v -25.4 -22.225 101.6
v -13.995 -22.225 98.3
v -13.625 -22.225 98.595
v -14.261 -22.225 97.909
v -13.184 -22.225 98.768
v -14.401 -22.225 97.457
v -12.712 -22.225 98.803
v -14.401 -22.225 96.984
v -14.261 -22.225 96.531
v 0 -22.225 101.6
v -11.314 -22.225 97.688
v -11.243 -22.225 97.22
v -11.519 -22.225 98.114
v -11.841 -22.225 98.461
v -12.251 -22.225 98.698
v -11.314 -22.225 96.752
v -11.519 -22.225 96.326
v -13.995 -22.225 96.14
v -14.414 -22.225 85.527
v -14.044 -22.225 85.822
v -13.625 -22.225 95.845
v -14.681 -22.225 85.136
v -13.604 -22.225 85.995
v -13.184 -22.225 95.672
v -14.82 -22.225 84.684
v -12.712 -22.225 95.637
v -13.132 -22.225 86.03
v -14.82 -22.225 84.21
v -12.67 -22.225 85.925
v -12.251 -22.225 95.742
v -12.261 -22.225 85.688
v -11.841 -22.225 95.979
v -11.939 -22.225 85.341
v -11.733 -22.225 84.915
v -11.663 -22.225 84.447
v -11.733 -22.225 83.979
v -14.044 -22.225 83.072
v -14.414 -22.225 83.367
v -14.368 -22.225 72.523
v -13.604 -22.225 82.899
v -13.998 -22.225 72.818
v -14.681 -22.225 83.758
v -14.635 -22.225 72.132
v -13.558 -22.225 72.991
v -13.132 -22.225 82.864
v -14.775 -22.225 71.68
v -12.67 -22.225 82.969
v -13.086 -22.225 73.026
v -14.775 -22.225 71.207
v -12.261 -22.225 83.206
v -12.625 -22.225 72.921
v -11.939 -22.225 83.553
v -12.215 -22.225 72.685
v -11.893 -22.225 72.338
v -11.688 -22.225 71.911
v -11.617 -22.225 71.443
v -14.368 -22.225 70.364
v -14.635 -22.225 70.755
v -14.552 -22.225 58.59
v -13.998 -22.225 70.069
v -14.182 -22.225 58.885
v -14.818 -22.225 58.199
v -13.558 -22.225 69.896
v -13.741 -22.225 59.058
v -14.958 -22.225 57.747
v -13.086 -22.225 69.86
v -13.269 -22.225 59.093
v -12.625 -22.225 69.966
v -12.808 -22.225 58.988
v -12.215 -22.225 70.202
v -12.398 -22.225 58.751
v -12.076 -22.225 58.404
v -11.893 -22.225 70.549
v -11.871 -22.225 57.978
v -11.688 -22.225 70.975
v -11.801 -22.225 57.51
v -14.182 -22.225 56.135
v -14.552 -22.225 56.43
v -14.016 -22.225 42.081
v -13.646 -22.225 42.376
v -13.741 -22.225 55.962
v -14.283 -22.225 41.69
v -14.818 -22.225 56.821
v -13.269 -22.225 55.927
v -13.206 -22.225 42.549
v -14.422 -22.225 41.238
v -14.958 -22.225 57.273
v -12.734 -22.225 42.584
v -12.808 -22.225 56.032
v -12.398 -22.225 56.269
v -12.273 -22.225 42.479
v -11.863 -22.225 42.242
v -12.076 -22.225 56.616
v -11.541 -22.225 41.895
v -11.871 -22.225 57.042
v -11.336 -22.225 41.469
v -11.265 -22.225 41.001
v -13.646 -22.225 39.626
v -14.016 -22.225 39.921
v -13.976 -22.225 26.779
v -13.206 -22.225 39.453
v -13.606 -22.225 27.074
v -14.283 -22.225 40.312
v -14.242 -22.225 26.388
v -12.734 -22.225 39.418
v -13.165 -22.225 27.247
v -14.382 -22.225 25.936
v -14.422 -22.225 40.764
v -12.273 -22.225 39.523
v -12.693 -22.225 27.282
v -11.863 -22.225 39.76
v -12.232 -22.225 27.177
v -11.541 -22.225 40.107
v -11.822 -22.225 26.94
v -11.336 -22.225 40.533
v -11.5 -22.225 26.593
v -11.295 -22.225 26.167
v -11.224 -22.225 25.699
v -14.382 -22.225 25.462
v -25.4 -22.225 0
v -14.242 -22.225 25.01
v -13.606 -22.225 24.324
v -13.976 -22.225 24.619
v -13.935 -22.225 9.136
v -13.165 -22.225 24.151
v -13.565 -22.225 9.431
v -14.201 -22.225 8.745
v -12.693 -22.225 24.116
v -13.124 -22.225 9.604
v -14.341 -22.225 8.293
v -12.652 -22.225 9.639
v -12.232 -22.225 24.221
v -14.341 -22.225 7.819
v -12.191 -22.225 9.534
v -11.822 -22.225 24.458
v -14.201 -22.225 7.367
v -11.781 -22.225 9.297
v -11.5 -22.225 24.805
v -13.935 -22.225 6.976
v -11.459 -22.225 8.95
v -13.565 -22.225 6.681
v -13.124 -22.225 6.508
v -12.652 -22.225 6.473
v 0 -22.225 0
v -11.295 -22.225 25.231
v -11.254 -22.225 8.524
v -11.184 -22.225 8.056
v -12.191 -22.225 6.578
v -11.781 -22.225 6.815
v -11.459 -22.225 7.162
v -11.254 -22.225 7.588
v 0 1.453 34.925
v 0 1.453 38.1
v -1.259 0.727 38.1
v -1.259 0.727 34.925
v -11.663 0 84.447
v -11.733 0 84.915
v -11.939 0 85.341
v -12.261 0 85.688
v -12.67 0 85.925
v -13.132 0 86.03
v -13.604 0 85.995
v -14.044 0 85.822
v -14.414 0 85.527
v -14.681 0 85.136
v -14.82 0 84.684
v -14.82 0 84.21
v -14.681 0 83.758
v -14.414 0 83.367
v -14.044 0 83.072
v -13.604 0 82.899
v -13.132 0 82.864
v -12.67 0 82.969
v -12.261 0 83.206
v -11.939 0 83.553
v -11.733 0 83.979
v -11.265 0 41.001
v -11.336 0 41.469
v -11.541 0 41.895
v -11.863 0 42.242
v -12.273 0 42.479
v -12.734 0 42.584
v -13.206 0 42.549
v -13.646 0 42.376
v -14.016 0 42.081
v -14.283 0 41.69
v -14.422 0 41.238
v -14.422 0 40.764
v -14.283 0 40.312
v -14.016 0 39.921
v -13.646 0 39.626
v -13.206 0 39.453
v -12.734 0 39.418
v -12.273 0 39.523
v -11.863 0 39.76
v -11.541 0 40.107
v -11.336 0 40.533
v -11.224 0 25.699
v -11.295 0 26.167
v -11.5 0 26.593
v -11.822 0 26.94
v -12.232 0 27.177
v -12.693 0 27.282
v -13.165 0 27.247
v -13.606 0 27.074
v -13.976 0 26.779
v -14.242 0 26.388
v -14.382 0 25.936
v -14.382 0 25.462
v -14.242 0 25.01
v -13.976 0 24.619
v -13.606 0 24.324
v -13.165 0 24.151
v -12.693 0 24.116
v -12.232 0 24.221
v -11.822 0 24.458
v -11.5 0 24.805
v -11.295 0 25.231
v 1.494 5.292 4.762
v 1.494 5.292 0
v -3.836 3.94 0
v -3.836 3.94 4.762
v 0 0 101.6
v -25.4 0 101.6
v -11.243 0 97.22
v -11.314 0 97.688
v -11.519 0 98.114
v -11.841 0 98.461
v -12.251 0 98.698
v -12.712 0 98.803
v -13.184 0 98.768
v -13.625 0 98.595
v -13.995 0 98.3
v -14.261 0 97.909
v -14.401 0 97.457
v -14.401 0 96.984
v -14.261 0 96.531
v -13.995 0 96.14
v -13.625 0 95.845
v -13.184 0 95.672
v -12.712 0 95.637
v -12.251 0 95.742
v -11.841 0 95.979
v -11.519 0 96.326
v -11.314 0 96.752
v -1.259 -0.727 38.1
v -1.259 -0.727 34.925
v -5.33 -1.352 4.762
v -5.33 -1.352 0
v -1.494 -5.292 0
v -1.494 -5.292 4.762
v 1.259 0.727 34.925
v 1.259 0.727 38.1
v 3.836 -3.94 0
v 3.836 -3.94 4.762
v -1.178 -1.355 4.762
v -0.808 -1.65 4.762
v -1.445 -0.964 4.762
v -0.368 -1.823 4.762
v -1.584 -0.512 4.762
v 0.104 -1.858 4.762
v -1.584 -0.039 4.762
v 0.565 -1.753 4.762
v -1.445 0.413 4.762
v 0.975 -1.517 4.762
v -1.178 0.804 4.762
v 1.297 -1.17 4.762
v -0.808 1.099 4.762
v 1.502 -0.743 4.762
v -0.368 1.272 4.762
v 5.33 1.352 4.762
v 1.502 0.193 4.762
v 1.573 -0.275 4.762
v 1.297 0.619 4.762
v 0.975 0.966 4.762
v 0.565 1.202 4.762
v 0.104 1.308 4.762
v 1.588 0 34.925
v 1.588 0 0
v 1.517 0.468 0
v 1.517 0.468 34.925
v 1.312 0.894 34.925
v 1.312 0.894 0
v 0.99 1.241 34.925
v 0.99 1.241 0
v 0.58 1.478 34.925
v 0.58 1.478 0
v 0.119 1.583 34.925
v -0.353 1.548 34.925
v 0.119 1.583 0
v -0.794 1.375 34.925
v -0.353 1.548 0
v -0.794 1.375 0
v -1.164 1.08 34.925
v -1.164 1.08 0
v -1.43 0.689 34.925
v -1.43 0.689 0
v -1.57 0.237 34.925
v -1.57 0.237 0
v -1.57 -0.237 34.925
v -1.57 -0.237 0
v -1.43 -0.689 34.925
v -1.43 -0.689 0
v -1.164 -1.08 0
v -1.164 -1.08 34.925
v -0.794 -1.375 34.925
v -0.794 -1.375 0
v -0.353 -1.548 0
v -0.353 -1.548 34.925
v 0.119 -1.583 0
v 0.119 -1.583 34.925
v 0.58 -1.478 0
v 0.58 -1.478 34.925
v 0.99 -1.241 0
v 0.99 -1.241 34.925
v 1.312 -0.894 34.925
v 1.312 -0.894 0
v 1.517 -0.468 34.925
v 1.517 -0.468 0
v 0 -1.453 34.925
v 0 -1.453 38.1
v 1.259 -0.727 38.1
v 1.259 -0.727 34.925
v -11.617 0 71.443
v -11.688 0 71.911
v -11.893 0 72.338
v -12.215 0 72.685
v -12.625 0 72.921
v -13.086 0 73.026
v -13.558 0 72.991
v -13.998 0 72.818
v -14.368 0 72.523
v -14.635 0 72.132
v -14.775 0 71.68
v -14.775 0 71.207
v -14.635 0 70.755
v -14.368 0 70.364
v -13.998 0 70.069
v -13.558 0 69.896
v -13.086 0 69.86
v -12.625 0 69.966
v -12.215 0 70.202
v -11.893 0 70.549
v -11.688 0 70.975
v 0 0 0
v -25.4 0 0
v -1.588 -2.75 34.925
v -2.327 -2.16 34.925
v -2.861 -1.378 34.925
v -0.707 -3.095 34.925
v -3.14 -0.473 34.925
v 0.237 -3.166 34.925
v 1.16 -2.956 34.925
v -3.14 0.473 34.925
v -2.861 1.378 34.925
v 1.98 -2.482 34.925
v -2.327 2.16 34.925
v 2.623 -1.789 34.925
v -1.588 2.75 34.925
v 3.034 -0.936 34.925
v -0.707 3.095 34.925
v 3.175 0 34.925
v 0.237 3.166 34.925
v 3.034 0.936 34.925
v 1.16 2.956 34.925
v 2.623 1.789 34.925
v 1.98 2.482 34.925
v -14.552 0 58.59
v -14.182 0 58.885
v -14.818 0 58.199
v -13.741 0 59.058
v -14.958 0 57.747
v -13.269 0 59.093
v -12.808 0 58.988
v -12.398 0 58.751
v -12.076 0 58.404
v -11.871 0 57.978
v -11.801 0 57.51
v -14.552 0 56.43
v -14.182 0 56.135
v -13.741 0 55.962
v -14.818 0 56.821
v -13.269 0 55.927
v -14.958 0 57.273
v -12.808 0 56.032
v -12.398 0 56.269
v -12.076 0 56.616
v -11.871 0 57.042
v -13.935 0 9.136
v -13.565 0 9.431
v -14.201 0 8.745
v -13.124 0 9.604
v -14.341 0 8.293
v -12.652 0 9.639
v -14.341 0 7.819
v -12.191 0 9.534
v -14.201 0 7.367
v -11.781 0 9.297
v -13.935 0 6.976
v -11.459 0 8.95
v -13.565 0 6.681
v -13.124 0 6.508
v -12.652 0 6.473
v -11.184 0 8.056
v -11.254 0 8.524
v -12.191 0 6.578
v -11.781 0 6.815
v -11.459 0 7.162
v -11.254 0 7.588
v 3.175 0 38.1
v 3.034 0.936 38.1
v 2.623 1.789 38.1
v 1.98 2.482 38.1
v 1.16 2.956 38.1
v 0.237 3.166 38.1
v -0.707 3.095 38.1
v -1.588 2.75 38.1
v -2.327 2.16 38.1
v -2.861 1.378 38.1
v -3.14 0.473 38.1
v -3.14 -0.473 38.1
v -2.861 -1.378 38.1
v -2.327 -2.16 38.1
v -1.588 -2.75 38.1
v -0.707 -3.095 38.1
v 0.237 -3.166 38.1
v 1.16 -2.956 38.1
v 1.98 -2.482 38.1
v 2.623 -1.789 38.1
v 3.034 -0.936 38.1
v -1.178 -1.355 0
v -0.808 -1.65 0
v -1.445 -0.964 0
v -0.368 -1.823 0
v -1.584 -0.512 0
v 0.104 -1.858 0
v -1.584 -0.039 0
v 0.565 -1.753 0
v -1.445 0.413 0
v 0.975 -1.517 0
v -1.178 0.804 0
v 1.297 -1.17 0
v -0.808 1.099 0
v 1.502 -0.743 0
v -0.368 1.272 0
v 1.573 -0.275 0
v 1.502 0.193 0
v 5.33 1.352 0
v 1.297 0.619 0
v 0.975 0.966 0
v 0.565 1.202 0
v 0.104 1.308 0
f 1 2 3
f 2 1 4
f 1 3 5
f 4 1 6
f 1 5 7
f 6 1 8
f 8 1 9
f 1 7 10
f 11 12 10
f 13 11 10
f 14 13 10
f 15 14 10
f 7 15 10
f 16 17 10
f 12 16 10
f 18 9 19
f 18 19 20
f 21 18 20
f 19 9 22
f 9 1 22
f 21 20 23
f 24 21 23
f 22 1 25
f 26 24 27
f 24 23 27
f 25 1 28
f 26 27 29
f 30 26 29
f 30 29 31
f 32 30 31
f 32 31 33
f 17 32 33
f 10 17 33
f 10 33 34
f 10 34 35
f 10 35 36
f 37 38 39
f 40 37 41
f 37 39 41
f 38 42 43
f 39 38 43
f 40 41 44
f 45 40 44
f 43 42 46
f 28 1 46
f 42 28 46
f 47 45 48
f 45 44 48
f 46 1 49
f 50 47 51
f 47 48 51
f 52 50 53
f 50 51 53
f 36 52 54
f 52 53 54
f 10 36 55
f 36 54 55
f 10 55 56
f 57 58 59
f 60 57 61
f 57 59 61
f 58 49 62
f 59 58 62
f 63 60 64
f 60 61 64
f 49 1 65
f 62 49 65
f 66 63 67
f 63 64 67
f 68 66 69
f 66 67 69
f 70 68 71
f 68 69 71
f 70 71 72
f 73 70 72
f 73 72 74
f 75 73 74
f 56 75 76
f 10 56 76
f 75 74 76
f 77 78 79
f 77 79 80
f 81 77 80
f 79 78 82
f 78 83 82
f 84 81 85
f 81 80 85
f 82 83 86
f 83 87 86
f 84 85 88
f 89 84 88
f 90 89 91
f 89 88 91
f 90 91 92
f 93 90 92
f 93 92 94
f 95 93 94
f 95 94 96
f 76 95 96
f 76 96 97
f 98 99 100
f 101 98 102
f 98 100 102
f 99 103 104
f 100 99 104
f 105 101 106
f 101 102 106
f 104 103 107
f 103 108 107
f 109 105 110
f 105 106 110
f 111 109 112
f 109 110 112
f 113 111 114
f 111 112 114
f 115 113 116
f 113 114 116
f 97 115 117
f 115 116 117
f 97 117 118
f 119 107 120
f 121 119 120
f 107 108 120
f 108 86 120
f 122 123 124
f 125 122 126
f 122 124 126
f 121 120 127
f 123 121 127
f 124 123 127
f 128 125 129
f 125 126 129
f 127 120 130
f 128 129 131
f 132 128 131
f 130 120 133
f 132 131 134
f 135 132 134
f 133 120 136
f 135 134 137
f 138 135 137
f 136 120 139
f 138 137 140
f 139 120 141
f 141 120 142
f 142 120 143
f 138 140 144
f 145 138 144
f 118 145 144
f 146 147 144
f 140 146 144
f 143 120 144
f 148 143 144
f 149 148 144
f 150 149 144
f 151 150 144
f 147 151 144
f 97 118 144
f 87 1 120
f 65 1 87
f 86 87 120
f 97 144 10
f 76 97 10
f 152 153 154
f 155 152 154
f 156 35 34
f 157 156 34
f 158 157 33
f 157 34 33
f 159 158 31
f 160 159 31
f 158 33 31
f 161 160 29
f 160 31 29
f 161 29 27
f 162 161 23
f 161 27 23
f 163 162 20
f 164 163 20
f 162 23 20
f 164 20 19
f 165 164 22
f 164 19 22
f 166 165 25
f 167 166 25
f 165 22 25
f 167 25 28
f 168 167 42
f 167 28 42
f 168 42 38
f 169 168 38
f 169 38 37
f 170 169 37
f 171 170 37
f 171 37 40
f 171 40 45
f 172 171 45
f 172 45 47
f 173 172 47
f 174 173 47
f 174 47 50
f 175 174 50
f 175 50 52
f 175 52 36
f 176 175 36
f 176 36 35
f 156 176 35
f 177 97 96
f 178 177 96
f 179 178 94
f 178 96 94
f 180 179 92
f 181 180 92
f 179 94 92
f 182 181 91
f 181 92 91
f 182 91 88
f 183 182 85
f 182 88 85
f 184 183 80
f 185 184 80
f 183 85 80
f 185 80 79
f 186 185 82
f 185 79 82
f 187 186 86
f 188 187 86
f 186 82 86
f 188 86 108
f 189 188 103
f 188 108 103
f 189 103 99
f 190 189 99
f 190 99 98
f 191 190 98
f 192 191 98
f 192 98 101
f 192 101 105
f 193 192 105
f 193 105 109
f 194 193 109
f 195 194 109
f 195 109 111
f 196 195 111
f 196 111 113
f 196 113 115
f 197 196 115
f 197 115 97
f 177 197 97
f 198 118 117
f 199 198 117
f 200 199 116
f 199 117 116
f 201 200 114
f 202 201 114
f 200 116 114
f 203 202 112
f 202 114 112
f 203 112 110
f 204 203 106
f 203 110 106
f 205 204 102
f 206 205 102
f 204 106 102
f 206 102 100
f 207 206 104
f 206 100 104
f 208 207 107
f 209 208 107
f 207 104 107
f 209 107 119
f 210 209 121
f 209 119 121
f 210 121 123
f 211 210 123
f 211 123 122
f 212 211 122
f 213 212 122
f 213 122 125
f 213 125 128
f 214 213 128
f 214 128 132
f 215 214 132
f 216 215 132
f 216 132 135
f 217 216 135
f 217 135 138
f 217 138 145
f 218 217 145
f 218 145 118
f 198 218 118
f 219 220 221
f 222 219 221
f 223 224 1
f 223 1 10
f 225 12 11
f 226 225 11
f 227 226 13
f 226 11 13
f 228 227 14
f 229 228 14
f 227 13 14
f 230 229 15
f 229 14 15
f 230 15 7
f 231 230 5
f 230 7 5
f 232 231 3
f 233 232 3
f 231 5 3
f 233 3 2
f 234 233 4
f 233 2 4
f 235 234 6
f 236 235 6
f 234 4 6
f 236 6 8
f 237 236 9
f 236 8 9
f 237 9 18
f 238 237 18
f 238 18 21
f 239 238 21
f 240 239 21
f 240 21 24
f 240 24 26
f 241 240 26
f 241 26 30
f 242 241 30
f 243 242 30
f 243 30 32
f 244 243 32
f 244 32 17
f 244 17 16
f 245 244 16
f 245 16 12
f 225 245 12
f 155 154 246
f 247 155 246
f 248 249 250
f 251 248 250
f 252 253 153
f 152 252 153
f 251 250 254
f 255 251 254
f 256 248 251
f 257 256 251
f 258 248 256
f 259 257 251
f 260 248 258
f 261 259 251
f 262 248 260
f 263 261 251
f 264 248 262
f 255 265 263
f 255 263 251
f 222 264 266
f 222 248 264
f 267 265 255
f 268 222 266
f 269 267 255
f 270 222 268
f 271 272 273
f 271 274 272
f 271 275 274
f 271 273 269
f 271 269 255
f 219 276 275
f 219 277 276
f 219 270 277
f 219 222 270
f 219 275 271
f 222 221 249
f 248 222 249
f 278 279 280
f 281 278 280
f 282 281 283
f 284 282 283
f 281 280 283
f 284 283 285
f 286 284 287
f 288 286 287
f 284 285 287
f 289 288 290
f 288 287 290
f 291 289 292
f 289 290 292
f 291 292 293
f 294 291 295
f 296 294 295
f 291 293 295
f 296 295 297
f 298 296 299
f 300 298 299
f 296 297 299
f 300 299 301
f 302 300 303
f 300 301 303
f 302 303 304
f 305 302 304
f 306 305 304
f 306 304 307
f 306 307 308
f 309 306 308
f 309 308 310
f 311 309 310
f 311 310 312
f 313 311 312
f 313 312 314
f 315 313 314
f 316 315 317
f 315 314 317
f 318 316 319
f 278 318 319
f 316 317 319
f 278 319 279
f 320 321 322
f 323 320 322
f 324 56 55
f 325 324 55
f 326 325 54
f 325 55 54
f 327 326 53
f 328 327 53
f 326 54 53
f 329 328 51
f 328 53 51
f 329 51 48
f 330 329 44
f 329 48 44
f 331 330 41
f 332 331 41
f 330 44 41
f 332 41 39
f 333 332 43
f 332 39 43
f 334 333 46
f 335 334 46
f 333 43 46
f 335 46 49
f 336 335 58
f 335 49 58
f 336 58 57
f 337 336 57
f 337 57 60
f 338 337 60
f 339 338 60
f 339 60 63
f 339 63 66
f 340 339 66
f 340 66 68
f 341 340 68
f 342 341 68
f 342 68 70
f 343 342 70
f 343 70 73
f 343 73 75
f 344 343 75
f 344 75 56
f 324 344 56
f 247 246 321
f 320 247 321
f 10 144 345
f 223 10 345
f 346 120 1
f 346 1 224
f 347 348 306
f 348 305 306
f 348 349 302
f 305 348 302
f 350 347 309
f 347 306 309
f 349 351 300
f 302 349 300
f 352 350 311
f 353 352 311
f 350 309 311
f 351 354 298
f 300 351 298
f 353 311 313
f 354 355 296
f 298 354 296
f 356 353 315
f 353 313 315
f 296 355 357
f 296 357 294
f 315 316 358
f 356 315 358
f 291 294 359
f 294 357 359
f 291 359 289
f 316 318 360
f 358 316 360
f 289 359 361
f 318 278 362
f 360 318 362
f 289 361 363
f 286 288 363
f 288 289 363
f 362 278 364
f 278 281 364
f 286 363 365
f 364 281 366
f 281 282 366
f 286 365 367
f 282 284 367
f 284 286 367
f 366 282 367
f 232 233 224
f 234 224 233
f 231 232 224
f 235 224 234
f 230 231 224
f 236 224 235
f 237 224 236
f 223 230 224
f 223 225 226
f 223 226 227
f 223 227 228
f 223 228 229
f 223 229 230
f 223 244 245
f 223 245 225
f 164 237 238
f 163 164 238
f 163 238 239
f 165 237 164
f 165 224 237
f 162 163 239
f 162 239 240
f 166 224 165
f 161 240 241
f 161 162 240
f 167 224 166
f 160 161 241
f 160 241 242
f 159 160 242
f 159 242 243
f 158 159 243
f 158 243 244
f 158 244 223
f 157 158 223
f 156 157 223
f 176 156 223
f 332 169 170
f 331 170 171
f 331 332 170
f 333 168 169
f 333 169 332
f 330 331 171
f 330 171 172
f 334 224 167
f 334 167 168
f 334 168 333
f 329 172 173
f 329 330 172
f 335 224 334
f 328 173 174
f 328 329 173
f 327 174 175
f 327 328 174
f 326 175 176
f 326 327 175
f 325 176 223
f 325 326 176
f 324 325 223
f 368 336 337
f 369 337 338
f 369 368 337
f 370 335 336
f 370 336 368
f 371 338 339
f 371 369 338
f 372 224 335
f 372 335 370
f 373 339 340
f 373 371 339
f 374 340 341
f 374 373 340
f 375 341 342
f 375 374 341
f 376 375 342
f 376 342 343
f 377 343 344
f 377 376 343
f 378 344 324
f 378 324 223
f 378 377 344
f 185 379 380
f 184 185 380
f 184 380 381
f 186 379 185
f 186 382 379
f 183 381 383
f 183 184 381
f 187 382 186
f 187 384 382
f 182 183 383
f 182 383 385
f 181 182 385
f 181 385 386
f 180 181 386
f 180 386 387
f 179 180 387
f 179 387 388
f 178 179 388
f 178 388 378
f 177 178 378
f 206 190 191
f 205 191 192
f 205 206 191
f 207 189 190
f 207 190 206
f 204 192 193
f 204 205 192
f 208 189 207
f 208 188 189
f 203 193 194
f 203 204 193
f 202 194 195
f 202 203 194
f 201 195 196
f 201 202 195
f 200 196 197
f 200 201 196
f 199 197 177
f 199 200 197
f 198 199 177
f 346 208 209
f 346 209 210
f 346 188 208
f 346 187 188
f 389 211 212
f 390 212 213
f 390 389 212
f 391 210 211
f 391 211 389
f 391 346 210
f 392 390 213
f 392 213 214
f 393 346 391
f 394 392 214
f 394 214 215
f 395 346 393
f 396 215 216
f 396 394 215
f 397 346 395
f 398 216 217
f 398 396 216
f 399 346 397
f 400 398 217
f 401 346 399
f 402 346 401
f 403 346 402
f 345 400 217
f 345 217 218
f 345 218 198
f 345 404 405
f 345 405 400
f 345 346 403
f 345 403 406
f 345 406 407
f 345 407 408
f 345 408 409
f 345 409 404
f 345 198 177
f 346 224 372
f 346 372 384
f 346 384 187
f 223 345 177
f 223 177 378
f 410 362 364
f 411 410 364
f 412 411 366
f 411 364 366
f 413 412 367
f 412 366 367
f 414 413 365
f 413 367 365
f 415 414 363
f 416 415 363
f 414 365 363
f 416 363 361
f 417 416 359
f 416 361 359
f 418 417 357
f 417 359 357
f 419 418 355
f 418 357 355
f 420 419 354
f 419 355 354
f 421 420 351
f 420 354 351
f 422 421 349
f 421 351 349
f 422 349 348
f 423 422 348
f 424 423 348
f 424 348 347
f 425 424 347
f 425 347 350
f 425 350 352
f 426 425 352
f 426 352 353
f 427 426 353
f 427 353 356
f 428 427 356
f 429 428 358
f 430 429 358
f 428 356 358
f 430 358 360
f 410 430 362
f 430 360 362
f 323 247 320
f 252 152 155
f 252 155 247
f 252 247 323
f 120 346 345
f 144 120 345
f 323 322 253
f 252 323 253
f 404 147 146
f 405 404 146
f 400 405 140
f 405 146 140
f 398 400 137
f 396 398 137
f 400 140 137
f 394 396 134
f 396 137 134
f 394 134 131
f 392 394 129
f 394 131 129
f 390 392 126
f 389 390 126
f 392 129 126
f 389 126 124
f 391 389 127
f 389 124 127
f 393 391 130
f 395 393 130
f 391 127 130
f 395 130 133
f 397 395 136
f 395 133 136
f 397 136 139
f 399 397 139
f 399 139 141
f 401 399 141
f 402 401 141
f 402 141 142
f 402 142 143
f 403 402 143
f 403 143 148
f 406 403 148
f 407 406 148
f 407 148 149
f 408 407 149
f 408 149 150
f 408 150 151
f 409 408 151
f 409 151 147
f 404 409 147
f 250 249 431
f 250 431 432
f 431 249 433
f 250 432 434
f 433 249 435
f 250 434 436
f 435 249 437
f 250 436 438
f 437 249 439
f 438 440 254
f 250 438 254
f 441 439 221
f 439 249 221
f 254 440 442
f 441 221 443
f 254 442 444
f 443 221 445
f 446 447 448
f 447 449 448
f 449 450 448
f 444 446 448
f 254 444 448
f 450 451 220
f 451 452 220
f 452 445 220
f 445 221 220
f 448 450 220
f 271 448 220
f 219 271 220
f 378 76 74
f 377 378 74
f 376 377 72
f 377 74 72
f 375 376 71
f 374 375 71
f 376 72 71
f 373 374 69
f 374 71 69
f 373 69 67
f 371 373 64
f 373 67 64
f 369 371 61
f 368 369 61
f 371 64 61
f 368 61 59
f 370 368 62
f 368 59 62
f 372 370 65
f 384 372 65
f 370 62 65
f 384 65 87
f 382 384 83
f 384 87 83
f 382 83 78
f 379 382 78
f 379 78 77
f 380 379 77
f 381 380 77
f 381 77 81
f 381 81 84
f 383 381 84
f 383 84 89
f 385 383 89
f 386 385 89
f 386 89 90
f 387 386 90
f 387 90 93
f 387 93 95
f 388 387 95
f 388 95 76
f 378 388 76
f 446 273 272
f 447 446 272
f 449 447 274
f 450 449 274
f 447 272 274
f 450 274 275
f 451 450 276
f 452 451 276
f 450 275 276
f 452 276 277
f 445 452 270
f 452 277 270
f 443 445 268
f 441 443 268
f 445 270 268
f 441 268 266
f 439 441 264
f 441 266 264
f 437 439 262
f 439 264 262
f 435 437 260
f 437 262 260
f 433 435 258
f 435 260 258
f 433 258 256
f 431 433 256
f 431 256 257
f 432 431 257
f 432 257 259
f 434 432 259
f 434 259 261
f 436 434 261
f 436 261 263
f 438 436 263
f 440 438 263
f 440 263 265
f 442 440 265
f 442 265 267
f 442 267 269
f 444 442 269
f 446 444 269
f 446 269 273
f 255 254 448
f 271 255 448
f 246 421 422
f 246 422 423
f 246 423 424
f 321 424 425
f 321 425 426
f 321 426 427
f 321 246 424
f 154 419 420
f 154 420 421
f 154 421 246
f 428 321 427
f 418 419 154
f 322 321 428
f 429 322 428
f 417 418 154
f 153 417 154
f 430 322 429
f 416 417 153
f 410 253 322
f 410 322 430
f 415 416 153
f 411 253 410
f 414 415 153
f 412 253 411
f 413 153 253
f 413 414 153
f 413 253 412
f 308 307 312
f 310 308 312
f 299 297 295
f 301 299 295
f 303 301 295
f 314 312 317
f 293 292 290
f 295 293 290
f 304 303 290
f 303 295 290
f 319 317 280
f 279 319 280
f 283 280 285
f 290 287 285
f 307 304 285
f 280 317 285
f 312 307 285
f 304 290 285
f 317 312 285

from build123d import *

# Parameters (mm, degrees)
F1_DEPTH  = 4.7625
F2_R      = 1.5875
F3_DEPTH  = 25.4
F4_R      = 1.5875
F5_DEPTH  = 34.925
F6_R      = 3.175
F7_DEPTH  = 3.175
F9_DEPTH  = 3.175
F10_W     = 25.4
F10_H     = 22.225
F11_DEPTH = 101.6
F12_R     = 1.5875
F13_DEPTH = 25.4


with BuildPart() as f1:
    # F0 (on Top) → F1 (new body)
    with BuildSketch(Plane.XY):
        Polygon((-5.330464, -1.352047), (-1.494325, -5.292341), (3.836139, -3.940293), (5.330464, 1.352047), (1.494325, 5.292341), (-3.836139, 3.940293), align=None)
    extrude(amount=F1_DEPTH)

    # F2 (on face) → F3 (cut)
    with BuildSketch(Plane.XY.offset(4.7625)):
        with Locations((-0.014651, -0.275343)):
            Circle(F2_R)
    extrude(amount=-F3_DEPTH, mode=Mode.SUBTRACT)


with BuildPart() as f5:
    # F4 (on Top) → F5 (new body)
    with BuildSketch(Plane.XY):
        Circle(F4_R)
    extrude(amount=F5_DEPTH)

    # F6 (on face) → F7 (join)
    with BuildSketch(Plane.XY.offset(34.925)):
        Circle(F6_R)
    extrude(amount=F7_DEPTH)

    # F8 (on face) → F9 (cut)
    with BuildSketch(Plane.XY.offset(38.1)):
        Polygon((1.258599, -0.726652), (1.258599, 0.726652), (0, 1.453305), (-1.258599, 0.726652), (-1.258599, -0.726652), (0, -1.453305), align=None)
    extrude(amount=-F9_DEPTH, mode=Mode.SUBTRACT)


with BuildPart() as f11:
    # F10 (on Top) → F11 (new body)
    with BuildSketch(Plane.XY):
        with Locations((-12.7, -11.1125)):
            Rectangle(F10_W, F10_H)
    extrude(amount=F11_DEPTH)

    # F12 (on face) → F13 (cut)
    with BuildSketch(Plane.XZ.offset(22.225)):
        with Locations((-12.771082, 8.055969)):
            Circle(F12_R)
        with Locations((-12.811904, 25.698902)):
            Circle(F12_R)
        with Locations((-12.852621, 41.00094)):
            Circle(F12_R)
        with Locations((-13.388035, 57.51)):
            Circle(F12_R)
        with Locations((-13.204748, 71.443364)):
            Circle(F12_R)
        with Locations((-13.250411, 84.447086)):
            Circle(F12_R)
        with Locations((-12.830836, 97.220197)):
            Circle(F12_R)
    extrude(amount=-F13_DEPTH, mode=Mode.SUBTRACT)


solid = Compound([f1.part, f5.part, f11.part])
